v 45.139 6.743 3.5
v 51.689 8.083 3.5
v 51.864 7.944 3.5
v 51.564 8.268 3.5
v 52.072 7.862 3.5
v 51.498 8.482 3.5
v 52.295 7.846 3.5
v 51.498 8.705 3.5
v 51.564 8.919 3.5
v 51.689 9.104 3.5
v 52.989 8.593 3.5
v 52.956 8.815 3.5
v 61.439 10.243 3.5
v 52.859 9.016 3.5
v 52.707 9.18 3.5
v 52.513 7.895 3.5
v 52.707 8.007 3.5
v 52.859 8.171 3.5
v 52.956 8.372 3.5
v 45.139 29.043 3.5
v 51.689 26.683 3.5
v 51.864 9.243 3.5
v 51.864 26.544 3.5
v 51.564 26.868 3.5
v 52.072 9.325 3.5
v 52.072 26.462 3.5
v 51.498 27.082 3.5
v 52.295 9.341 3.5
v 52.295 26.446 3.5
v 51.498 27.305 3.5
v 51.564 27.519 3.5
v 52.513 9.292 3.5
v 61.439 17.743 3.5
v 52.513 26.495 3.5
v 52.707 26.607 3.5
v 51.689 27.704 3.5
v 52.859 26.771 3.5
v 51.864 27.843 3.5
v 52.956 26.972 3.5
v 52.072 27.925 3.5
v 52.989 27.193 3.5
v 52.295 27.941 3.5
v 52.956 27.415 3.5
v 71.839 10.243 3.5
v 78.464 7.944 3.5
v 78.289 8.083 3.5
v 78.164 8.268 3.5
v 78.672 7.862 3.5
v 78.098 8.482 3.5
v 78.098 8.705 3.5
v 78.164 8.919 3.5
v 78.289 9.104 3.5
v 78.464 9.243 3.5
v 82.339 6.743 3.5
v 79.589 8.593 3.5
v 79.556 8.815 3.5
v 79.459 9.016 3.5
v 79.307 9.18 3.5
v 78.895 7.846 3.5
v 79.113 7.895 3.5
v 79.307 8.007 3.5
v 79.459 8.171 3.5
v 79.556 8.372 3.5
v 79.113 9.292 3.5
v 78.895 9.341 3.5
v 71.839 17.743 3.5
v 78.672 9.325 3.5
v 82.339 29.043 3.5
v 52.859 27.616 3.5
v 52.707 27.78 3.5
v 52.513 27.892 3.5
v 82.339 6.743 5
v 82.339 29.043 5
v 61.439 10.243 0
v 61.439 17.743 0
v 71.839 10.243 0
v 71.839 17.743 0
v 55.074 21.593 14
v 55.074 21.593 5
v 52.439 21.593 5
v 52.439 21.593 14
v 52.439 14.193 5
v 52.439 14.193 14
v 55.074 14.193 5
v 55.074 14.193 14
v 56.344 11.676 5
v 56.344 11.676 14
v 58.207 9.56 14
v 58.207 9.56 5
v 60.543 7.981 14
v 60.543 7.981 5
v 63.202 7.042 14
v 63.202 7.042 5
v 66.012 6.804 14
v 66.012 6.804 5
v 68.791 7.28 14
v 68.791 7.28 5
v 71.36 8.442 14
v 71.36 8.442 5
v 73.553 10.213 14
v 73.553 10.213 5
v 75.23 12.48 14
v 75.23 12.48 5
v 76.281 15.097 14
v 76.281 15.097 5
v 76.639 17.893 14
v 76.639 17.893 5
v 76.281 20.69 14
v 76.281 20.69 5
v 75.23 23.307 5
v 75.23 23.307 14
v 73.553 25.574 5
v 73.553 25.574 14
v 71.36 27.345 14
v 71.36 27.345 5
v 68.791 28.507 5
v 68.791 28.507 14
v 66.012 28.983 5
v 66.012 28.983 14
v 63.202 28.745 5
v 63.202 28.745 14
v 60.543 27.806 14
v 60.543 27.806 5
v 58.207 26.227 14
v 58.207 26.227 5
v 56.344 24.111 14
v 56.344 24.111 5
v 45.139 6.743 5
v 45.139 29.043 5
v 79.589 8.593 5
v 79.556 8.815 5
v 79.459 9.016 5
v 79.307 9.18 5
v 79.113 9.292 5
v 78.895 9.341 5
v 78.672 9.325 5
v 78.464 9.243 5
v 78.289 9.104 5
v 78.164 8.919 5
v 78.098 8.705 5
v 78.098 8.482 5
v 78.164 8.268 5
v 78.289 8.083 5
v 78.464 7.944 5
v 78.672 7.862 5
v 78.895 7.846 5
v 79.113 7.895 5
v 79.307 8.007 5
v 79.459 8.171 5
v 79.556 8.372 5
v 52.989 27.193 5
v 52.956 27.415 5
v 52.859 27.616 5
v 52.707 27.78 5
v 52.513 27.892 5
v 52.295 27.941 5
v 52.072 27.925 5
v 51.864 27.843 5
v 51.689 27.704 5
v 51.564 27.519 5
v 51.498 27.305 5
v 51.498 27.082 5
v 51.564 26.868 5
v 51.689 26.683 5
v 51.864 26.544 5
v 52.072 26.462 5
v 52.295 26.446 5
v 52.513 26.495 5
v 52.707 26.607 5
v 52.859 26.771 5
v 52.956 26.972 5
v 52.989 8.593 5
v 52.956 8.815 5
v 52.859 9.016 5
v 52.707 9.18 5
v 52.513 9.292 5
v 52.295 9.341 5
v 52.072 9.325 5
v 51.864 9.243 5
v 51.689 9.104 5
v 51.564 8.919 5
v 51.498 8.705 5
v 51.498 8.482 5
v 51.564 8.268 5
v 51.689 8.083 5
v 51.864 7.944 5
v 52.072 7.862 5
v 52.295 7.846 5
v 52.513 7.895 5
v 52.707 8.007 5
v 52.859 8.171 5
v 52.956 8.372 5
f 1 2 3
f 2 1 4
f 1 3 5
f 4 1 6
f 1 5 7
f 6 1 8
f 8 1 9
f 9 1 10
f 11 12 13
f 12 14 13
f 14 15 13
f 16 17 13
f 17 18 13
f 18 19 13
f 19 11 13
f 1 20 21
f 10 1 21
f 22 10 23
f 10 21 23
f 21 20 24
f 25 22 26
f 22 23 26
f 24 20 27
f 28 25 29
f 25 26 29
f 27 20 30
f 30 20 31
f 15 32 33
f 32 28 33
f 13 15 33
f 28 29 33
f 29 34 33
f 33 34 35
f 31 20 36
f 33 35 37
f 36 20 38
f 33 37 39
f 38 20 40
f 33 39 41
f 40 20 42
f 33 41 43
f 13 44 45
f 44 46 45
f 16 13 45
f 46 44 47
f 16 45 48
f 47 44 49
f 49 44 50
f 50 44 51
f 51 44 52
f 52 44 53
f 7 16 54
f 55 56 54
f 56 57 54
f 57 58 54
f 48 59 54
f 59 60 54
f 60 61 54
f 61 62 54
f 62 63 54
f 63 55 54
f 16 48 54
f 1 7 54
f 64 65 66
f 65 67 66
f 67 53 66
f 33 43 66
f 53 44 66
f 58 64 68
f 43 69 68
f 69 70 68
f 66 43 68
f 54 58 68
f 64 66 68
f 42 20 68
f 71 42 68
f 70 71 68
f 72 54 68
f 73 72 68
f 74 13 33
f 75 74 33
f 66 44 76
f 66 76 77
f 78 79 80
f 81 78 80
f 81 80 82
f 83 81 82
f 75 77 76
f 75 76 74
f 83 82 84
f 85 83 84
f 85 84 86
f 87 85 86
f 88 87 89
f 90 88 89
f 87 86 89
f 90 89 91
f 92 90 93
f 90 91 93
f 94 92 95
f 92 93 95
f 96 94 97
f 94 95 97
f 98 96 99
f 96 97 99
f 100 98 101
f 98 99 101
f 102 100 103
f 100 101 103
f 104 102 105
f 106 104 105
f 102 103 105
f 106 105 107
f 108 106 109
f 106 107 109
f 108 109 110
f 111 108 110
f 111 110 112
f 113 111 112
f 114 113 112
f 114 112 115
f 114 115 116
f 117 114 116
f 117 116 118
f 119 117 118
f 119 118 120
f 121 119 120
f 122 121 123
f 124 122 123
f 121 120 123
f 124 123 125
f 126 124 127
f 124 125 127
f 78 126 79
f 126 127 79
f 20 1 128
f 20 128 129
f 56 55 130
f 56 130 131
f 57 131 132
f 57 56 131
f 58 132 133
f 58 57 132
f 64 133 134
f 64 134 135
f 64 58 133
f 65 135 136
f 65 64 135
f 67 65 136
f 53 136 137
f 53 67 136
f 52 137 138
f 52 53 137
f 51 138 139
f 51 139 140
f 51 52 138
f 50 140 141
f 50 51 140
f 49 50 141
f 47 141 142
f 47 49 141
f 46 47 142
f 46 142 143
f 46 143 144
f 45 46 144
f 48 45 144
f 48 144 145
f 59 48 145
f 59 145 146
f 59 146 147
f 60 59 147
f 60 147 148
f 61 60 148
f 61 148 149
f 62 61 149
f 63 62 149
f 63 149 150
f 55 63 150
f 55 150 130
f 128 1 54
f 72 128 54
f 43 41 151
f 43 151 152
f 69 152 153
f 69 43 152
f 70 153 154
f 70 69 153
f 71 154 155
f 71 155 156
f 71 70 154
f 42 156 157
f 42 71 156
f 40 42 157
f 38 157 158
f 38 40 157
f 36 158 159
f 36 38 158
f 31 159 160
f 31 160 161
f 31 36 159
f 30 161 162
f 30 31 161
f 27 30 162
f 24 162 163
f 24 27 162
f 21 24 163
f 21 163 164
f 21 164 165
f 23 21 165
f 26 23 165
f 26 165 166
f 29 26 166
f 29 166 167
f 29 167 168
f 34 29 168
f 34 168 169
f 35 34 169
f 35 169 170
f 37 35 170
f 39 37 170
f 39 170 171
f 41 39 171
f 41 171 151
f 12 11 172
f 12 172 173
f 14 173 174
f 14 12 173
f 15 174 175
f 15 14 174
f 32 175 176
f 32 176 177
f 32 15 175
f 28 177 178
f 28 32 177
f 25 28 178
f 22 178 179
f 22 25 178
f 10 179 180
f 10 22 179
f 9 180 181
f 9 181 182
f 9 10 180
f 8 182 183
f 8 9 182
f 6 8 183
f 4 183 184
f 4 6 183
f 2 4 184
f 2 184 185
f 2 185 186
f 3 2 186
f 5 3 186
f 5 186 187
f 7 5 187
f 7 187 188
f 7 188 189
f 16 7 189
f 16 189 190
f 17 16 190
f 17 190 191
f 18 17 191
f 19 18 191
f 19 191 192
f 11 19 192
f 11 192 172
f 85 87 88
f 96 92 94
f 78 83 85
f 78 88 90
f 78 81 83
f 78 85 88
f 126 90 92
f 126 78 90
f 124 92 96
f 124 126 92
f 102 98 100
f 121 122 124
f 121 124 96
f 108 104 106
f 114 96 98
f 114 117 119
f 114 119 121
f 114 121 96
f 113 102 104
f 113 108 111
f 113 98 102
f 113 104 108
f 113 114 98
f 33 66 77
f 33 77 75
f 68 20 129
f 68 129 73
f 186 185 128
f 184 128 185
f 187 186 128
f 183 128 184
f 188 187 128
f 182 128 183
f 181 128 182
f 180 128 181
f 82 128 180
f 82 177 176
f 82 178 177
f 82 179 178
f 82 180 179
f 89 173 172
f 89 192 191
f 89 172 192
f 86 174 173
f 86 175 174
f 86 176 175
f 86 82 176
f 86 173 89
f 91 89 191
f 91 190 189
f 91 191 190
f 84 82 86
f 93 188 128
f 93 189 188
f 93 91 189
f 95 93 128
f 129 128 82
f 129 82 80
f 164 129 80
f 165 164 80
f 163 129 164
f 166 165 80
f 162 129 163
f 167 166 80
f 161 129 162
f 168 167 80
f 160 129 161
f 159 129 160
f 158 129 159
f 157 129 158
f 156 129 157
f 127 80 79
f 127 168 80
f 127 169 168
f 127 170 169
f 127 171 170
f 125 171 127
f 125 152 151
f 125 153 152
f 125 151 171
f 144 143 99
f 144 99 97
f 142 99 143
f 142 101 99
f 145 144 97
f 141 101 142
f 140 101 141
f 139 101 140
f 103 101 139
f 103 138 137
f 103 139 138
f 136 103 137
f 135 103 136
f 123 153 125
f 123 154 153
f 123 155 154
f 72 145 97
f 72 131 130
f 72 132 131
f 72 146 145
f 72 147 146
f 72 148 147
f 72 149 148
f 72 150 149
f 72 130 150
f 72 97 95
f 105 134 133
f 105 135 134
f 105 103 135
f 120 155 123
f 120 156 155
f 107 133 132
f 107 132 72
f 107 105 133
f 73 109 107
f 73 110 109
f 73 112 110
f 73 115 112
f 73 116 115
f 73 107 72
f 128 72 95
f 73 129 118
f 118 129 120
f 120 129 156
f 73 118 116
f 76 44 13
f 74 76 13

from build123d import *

# Parameters (mm, degrees)
SKETCH_1_W          = 37.2
SKETCH_1_H          = 22.3
SKETCH_1_R          = 0.75
EXTRUDE_1_DEPTH     = 5
SKETCH_1_3_W        = 37.2
SKETCH_1_3_H        = 22.3
SKETCH_1_3_R        = 0.75
CUT_EXTRUDE_2_DEPTH = 3.5
EXTRUDE_3_DEPTH     = 9
SKETCH_4_W          = 10.4
SKETCH_4_H          = 7.5
EXTRUDE_4_DEPTH     = 3.5


with BuildPart() as part:
    # 草圖1 → 填料-伸長1 (new body)
    with BuildSketch(Plane.XY):
        with Locations((63.739258578, 17.893460251)):
            Rectangle(SKETCH_1_W, SKETCH_1_H)
        with Locations((78.839258578, 8.593460251)):
            Circle(SKETCH_1_R, mode=Mode.SUBTRACT)
        with Locations((52.239258578, 27.193460251)):
            Circle(SKETCH_1_R, mode=Mode.SUBTRACT)
        with Locations((52.239258578, 8.593460251)):
            Circle(SKETCH_1_R, mode=Mode.SUBTRACT)
    extrude(amount=EXTRUDE_1_DEPTH)

    # 草圖1<3> → 除料-伸長2 (cut)
    with BuildSketch(Plane.XY):
        with Locations((63.739258578, 17.893460251)):
            Rectangle(SKETCH_1_3_W, SKETCH_1_3_H)
        with Locations((78.839258578, 8.593460251)):
            Circle(SKETCH_1_3_R, mode=Mode.SUBTRACT)
        with Locations((52.239258578, 27.193460251)):
            Circle(SKETCH_1_3_R, mode=Mode.SUBTRACT)
        with Locations((52.239258578, 8.593460251)):
            Circle(SKETCH_1_3_R, mode=Mode.SUBTRACT)
    extrude(amount=CUT_EXTRUDE_2_DEPTH, mode=Mode.SUBTRACT)

    # 草圖3 → 填料-伸長3 (add)
    with BuildSketch(Plane.XY.offset(5)):
        with BuildLine():
            Line((52.439258578, 14.193460251), (55.074078216, 14.193460251))
            ThreePointArc((55.074078216, 14.193460251), (76.639258578, 17.893460251), (55.074078216, 21.593460251))
            Line((55.074078216, 21.593460251), (52.439258578, 21.593460251))
            Line((52.439258578, 21.593460251), (52.439258578, 14.193460251))
        make_face()
    extrude(amount=EXTRUDE_3_DEPTH)

    # 草圖4 → 填料-伸長4 (add)
    with BuildSketch(Plane(origin=(0, 0, 3.5), x_dir=(-1, 0, 0), z_dir=(0, 0, -1))):
        with Locations((-66.639258578, 13.993460251)):
            Rectangle(SKETCH_4_W, SKETCH_4_H)
    extrude(amount=EXTRUDE_4_DEPTH)


solid = part.part
